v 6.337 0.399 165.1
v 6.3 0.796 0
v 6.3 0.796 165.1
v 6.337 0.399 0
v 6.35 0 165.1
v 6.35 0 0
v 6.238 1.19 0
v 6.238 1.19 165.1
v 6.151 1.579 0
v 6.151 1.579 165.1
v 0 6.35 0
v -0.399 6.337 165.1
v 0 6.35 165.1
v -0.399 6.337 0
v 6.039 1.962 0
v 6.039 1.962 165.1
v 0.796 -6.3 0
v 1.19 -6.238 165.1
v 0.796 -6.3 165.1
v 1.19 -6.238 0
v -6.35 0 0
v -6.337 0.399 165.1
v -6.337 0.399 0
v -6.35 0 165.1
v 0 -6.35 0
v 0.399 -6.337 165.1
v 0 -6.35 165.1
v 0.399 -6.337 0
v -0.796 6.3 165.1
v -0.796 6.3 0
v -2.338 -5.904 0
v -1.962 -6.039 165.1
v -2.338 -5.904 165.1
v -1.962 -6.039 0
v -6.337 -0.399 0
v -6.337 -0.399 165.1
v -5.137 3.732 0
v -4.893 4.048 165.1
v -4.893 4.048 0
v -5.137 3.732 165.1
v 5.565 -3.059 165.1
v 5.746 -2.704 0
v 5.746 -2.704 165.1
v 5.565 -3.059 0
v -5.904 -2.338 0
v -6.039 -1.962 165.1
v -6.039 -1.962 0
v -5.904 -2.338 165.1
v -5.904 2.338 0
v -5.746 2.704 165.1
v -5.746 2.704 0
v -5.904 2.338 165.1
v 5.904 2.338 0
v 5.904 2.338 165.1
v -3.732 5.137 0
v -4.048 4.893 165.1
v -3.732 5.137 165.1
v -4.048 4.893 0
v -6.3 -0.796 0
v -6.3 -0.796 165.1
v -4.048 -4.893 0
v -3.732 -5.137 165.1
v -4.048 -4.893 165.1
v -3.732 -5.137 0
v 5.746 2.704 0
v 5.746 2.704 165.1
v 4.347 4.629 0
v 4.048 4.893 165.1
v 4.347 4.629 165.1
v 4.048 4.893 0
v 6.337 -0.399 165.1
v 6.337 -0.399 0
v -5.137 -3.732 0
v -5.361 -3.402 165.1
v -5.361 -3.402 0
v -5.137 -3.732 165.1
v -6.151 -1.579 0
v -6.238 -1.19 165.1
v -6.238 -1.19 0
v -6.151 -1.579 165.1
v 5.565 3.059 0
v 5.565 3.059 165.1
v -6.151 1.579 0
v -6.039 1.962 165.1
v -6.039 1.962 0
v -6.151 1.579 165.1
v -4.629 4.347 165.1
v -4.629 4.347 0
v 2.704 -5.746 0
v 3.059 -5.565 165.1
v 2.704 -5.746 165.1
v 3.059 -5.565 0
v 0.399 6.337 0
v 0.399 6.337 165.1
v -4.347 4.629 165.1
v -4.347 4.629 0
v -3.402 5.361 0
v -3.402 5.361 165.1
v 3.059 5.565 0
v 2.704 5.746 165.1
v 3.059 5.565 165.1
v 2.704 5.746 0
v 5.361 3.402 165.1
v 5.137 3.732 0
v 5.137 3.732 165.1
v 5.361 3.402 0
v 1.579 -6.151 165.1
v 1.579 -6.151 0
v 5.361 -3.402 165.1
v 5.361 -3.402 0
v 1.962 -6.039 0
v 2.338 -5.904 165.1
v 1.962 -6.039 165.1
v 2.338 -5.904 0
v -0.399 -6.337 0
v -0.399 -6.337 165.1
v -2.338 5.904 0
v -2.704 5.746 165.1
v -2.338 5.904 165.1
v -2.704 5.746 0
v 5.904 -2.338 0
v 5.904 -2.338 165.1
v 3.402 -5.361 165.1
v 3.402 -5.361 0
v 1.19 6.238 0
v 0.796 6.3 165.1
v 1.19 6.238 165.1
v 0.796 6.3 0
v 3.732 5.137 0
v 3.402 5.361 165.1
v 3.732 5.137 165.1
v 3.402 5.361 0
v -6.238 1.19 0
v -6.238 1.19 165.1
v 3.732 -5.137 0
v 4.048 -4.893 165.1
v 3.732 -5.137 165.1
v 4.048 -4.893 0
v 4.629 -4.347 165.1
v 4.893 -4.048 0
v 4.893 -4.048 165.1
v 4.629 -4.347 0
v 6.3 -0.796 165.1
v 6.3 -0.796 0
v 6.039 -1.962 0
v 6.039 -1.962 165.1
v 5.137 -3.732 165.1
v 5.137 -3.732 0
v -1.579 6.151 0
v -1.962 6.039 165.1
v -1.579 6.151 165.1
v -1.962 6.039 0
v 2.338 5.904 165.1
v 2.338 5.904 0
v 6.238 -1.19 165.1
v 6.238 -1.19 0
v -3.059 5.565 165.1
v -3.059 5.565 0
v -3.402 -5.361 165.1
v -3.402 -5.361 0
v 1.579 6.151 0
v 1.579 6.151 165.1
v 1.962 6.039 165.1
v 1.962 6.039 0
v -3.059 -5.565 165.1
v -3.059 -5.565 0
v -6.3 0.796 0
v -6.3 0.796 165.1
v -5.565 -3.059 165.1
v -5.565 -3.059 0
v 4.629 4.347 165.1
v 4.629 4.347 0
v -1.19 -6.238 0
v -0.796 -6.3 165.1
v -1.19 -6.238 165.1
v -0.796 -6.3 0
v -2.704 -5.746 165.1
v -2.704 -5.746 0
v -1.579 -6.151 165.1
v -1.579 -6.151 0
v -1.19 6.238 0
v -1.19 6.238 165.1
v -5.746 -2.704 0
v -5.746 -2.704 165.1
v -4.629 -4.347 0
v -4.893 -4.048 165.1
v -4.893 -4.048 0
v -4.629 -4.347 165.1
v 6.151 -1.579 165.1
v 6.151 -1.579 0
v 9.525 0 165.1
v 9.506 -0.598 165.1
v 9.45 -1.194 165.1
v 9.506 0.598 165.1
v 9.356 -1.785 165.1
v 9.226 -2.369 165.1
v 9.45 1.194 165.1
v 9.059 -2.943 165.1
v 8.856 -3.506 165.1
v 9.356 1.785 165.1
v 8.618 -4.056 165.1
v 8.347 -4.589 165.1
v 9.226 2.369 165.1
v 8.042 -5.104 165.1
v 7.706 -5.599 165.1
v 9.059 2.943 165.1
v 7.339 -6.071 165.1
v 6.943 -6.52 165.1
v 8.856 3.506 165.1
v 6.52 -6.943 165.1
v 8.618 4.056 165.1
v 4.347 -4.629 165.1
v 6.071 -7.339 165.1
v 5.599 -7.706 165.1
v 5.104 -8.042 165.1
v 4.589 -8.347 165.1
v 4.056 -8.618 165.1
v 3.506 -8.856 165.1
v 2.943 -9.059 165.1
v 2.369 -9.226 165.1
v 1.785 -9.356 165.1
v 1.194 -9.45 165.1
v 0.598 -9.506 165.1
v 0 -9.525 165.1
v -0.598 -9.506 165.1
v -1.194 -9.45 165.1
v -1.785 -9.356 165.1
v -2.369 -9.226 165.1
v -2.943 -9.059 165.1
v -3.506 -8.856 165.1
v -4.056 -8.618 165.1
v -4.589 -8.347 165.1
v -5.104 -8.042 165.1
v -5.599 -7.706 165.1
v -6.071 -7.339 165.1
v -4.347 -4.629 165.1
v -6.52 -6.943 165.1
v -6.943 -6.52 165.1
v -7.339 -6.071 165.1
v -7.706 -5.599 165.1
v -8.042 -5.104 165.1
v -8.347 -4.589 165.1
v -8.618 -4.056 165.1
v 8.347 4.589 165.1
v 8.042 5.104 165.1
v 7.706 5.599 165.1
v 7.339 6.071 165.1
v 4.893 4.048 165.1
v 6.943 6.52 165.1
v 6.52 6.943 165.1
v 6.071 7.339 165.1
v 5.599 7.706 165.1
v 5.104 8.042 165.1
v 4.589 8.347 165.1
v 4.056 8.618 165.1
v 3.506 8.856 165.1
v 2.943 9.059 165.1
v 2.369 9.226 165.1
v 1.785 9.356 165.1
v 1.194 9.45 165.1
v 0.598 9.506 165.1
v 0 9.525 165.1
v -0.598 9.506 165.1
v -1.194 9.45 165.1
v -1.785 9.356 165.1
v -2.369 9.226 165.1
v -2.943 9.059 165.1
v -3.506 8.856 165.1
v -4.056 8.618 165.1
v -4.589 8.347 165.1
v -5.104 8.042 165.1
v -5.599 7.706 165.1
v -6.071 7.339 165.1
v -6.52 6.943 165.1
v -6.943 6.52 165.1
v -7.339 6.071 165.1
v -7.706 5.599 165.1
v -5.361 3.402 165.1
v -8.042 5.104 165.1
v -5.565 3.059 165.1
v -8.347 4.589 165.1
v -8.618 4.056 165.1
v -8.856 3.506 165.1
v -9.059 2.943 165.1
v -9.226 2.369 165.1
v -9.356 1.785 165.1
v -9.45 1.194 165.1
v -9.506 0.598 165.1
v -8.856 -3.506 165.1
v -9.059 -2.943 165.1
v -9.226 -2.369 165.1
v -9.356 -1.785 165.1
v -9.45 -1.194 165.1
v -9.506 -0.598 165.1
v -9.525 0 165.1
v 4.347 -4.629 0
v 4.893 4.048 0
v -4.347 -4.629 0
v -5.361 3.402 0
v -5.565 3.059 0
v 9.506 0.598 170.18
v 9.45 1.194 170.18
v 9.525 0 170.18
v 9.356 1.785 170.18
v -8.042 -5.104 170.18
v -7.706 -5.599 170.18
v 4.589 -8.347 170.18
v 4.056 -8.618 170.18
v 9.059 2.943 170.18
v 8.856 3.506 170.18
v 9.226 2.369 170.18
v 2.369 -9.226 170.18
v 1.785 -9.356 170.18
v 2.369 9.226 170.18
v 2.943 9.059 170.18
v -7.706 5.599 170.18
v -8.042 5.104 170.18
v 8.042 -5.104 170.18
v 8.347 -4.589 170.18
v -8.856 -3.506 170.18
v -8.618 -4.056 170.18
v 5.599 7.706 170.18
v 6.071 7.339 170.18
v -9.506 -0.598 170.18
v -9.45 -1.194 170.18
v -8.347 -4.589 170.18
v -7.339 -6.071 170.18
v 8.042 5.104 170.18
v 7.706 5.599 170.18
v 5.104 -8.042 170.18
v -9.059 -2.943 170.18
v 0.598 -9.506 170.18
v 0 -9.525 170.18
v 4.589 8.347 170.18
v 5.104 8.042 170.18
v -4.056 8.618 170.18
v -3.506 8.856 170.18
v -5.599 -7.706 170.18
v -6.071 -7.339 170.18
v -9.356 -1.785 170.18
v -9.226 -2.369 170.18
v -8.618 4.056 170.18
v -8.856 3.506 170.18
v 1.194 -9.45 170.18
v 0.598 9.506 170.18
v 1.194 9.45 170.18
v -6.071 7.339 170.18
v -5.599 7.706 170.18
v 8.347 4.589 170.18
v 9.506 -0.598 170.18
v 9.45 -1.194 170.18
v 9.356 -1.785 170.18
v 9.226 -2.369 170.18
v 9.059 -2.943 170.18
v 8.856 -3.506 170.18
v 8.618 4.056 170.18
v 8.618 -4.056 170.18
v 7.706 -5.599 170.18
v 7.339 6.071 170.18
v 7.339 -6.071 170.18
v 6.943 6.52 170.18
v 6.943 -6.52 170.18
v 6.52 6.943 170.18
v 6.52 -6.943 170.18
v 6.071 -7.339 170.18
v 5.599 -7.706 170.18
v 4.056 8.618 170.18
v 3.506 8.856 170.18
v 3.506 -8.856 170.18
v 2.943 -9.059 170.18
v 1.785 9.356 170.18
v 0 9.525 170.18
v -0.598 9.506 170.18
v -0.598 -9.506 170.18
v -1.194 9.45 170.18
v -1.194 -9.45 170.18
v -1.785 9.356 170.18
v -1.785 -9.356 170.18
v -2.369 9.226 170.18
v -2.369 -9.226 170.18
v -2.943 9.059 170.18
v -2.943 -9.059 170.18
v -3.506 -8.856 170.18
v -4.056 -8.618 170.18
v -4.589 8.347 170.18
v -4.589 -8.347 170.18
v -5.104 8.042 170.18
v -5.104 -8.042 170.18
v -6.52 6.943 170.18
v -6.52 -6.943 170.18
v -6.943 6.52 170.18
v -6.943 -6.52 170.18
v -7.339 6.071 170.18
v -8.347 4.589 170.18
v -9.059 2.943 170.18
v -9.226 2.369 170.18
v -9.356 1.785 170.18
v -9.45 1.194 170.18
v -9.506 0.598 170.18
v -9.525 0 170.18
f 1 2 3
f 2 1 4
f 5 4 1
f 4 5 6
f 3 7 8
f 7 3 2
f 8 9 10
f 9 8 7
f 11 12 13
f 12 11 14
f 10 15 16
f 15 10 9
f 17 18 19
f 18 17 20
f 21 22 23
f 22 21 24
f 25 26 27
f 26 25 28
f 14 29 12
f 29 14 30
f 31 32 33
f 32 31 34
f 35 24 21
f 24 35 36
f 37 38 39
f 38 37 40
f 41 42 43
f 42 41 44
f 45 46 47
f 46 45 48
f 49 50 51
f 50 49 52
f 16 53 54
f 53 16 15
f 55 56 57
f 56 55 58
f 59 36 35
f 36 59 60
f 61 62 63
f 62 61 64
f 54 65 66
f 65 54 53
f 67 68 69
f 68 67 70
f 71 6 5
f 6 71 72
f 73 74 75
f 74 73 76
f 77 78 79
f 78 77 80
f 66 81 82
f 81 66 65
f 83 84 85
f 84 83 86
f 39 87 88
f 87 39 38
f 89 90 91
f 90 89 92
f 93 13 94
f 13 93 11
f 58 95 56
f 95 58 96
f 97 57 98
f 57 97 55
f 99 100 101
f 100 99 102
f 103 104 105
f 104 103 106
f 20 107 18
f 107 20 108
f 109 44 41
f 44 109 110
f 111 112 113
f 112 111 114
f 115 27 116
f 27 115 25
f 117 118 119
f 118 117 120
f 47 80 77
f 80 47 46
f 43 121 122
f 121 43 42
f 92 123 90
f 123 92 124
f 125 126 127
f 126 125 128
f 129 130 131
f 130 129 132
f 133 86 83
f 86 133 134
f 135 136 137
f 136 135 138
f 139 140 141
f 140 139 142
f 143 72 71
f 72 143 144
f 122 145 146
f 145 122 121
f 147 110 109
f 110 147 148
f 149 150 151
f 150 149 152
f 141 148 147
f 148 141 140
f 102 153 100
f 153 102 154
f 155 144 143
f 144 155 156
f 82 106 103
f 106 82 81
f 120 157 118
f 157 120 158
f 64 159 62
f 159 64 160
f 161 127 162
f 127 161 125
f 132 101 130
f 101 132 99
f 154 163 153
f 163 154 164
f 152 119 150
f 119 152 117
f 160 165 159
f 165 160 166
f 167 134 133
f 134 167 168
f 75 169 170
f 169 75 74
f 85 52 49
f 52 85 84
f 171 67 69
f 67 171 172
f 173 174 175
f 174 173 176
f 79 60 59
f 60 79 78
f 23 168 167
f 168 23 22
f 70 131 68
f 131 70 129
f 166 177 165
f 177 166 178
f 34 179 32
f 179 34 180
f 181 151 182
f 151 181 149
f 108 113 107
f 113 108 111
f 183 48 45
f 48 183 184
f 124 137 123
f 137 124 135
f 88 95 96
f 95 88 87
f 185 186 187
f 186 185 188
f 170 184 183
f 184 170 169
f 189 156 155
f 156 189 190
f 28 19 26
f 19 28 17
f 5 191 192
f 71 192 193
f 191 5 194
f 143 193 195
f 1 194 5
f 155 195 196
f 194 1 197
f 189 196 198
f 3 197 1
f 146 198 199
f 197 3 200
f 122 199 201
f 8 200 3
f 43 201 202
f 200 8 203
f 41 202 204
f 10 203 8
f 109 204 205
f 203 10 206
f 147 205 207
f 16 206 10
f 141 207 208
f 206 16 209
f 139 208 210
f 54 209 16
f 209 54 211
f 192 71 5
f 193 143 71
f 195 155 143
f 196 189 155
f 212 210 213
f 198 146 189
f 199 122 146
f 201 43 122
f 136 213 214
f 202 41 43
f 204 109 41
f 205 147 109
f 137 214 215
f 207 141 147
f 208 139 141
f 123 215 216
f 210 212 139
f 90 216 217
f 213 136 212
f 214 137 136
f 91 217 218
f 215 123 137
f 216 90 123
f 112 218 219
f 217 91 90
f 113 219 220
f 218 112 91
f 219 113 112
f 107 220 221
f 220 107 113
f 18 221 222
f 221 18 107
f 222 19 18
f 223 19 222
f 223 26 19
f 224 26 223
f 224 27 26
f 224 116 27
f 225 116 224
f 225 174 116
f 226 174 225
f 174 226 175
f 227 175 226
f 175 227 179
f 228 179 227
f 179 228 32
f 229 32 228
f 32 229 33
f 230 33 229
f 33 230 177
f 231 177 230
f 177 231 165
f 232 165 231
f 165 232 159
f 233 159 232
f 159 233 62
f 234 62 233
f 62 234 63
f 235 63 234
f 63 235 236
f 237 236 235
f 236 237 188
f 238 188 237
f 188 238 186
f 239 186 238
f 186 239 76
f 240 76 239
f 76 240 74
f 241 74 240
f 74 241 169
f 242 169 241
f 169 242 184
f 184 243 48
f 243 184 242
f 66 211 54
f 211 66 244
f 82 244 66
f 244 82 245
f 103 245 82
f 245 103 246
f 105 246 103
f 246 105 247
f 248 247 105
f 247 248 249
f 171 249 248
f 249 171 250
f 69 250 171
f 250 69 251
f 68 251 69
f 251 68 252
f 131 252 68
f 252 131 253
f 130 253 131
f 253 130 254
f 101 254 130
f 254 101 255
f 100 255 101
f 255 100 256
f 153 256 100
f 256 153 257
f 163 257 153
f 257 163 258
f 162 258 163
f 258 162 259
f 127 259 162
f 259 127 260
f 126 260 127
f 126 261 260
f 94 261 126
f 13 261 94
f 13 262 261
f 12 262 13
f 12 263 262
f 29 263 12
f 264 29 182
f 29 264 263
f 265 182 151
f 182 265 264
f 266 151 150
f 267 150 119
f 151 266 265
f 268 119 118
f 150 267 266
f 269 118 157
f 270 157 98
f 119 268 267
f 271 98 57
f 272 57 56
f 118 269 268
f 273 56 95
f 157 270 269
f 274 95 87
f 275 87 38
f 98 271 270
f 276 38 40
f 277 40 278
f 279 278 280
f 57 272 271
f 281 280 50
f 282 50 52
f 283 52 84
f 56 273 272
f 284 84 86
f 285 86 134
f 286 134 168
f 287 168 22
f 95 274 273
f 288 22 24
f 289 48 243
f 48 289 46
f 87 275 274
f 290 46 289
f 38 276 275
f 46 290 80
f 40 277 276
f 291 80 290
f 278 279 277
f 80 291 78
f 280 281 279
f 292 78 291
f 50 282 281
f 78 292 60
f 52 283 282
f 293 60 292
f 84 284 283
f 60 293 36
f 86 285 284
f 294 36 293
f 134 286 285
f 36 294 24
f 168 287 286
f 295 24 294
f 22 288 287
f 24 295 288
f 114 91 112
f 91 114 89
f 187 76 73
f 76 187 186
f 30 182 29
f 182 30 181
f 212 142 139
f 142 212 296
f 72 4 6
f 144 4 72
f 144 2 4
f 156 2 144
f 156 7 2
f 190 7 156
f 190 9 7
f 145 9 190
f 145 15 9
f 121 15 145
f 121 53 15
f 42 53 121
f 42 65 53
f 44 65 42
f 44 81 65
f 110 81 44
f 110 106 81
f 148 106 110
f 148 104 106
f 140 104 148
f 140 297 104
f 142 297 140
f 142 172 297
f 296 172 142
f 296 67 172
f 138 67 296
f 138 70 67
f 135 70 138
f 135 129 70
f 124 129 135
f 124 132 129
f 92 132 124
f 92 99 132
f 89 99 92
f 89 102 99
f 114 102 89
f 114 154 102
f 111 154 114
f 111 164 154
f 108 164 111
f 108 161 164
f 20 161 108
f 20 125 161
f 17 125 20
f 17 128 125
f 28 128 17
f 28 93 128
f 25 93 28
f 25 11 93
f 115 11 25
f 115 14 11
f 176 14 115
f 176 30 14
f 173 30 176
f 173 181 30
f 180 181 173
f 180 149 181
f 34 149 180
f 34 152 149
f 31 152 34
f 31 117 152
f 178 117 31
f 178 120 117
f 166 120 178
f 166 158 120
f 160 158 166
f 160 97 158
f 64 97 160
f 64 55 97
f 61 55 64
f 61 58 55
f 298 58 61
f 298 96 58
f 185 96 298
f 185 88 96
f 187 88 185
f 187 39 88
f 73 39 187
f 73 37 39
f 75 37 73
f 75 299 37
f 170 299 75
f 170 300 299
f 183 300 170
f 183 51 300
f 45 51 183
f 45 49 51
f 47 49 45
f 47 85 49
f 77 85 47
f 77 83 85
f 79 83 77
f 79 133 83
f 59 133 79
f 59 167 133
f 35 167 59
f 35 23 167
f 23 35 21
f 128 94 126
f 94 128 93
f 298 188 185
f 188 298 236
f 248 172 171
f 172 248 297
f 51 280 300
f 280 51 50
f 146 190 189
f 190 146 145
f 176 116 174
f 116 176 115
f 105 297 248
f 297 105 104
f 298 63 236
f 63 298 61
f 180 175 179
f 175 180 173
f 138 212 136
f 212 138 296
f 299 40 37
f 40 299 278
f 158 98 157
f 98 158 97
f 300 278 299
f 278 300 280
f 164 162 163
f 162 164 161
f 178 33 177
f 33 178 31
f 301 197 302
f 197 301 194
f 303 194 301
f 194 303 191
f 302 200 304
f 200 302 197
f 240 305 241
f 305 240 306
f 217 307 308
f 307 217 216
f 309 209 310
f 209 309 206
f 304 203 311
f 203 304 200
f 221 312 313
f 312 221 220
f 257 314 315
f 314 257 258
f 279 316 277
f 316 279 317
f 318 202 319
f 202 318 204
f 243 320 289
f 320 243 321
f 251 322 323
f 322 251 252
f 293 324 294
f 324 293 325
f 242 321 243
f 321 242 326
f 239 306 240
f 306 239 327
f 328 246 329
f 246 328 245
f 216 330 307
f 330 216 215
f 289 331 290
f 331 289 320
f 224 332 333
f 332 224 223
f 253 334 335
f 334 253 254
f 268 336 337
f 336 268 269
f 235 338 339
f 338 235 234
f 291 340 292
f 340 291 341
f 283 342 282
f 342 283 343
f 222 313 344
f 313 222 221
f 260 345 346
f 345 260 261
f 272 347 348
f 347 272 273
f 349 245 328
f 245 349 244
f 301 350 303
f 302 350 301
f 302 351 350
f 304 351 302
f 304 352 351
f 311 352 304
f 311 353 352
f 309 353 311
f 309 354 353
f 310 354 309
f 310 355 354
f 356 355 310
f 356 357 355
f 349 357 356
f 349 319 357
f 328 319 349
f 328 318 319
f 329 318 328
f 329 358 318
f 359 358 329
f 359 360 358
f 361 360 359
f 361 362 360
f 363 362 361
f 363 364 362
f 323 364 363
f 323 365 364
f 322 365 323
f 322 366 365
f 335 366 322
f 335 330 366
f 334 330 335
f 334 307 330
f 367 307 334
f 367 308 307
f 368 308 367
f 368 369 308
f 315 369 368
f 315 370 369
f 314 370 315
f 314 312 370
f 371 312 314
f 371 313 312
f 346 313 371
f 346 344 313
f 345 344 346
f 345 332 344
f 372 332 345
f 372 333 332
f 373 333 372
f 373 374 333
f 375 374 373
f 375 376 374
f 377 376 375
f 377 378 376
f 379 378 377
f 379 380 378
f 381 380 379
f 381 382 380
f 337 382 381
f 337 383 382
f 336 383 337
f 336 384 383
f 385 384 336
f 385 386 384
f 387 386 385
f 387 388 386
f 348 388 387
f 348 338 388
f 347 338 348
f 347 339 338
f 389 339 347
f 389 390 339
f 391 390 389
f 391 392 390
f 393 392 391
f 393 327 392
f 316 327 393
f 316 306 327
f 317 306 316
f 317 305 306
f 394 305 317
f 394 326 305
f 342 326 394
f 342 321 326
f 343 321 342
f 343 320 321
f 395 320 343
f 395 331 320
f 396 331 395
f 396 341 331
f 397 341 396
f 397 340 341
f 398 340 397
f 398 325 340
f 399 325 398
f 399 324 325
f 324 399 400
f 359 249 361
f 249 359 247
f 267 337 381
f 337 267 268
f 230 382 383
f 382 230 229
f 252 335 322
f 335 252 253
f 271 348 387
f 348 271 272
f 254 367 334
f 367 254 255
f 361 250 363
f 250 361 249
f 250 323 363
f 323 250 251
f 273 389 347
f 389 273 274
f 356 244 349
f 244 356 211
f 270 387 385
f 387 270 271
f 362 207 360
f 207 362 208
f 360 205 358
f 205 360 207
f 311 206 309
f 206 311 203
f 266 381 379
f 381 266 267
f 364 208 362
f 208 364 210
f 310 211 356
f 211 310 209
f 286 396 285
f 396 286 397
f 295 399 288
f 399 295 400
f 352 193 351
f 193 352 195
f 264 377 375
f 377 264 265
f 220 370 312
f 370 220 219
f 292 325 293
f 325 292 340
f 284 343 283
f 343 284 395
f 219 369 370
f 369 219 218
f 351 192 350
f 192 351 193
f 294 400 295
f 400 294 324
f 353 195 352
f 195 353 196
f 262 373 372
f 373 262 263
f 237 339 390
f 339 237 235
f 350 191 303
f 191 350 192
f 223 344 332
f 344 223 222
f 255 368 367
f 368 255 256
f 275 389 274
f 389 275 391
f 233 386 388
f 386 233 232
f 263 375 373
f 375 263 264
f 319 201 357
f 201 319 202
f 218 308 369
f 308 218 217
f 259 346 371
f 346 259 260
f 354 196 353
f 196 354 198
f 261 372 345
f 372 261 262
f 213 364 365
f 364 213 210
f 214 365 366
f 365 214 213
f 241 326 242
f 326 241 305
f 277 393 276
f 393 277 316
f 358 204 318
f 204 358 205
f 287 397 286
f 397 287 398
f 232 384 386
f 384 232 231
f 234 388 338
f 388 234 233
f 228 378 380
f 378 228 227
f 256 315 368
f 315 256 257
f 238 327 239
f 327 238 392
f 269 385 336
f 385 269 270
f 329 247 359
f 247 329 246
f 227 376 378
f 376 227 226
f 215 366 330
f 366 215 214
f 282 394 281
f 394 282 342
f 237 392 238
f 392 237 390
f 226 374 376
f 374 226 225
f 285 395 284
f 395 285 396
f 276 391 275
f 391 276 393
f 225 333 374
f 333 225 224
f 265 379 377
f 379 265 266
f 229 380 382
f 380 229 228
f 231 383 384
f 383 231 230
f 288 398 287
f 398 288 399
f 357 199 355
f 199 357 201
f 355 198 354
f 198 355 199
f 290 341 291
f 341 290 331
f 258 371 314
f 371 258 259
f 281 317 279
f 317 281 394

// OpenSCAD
// Units in inches
inch = 25.4;

// Pin dimensions
pin_diameter = 0.5 * inch;
pin_length = 6.5 * inch;

// Head dimensions
head_diameter = 0.75 * inch;
head_height = 0.2 * inch;

$fn = 100; // smooth cylinder resolution

// Final pin with head
union() {
    // Pin body
    cylinder(h = pin_length, d = pin_diameter, center = false);
    
    // Head on top
    translate([0, 0, pin_length])
        cylinder(h = head_height, d = head_diameter, center = false);
}
